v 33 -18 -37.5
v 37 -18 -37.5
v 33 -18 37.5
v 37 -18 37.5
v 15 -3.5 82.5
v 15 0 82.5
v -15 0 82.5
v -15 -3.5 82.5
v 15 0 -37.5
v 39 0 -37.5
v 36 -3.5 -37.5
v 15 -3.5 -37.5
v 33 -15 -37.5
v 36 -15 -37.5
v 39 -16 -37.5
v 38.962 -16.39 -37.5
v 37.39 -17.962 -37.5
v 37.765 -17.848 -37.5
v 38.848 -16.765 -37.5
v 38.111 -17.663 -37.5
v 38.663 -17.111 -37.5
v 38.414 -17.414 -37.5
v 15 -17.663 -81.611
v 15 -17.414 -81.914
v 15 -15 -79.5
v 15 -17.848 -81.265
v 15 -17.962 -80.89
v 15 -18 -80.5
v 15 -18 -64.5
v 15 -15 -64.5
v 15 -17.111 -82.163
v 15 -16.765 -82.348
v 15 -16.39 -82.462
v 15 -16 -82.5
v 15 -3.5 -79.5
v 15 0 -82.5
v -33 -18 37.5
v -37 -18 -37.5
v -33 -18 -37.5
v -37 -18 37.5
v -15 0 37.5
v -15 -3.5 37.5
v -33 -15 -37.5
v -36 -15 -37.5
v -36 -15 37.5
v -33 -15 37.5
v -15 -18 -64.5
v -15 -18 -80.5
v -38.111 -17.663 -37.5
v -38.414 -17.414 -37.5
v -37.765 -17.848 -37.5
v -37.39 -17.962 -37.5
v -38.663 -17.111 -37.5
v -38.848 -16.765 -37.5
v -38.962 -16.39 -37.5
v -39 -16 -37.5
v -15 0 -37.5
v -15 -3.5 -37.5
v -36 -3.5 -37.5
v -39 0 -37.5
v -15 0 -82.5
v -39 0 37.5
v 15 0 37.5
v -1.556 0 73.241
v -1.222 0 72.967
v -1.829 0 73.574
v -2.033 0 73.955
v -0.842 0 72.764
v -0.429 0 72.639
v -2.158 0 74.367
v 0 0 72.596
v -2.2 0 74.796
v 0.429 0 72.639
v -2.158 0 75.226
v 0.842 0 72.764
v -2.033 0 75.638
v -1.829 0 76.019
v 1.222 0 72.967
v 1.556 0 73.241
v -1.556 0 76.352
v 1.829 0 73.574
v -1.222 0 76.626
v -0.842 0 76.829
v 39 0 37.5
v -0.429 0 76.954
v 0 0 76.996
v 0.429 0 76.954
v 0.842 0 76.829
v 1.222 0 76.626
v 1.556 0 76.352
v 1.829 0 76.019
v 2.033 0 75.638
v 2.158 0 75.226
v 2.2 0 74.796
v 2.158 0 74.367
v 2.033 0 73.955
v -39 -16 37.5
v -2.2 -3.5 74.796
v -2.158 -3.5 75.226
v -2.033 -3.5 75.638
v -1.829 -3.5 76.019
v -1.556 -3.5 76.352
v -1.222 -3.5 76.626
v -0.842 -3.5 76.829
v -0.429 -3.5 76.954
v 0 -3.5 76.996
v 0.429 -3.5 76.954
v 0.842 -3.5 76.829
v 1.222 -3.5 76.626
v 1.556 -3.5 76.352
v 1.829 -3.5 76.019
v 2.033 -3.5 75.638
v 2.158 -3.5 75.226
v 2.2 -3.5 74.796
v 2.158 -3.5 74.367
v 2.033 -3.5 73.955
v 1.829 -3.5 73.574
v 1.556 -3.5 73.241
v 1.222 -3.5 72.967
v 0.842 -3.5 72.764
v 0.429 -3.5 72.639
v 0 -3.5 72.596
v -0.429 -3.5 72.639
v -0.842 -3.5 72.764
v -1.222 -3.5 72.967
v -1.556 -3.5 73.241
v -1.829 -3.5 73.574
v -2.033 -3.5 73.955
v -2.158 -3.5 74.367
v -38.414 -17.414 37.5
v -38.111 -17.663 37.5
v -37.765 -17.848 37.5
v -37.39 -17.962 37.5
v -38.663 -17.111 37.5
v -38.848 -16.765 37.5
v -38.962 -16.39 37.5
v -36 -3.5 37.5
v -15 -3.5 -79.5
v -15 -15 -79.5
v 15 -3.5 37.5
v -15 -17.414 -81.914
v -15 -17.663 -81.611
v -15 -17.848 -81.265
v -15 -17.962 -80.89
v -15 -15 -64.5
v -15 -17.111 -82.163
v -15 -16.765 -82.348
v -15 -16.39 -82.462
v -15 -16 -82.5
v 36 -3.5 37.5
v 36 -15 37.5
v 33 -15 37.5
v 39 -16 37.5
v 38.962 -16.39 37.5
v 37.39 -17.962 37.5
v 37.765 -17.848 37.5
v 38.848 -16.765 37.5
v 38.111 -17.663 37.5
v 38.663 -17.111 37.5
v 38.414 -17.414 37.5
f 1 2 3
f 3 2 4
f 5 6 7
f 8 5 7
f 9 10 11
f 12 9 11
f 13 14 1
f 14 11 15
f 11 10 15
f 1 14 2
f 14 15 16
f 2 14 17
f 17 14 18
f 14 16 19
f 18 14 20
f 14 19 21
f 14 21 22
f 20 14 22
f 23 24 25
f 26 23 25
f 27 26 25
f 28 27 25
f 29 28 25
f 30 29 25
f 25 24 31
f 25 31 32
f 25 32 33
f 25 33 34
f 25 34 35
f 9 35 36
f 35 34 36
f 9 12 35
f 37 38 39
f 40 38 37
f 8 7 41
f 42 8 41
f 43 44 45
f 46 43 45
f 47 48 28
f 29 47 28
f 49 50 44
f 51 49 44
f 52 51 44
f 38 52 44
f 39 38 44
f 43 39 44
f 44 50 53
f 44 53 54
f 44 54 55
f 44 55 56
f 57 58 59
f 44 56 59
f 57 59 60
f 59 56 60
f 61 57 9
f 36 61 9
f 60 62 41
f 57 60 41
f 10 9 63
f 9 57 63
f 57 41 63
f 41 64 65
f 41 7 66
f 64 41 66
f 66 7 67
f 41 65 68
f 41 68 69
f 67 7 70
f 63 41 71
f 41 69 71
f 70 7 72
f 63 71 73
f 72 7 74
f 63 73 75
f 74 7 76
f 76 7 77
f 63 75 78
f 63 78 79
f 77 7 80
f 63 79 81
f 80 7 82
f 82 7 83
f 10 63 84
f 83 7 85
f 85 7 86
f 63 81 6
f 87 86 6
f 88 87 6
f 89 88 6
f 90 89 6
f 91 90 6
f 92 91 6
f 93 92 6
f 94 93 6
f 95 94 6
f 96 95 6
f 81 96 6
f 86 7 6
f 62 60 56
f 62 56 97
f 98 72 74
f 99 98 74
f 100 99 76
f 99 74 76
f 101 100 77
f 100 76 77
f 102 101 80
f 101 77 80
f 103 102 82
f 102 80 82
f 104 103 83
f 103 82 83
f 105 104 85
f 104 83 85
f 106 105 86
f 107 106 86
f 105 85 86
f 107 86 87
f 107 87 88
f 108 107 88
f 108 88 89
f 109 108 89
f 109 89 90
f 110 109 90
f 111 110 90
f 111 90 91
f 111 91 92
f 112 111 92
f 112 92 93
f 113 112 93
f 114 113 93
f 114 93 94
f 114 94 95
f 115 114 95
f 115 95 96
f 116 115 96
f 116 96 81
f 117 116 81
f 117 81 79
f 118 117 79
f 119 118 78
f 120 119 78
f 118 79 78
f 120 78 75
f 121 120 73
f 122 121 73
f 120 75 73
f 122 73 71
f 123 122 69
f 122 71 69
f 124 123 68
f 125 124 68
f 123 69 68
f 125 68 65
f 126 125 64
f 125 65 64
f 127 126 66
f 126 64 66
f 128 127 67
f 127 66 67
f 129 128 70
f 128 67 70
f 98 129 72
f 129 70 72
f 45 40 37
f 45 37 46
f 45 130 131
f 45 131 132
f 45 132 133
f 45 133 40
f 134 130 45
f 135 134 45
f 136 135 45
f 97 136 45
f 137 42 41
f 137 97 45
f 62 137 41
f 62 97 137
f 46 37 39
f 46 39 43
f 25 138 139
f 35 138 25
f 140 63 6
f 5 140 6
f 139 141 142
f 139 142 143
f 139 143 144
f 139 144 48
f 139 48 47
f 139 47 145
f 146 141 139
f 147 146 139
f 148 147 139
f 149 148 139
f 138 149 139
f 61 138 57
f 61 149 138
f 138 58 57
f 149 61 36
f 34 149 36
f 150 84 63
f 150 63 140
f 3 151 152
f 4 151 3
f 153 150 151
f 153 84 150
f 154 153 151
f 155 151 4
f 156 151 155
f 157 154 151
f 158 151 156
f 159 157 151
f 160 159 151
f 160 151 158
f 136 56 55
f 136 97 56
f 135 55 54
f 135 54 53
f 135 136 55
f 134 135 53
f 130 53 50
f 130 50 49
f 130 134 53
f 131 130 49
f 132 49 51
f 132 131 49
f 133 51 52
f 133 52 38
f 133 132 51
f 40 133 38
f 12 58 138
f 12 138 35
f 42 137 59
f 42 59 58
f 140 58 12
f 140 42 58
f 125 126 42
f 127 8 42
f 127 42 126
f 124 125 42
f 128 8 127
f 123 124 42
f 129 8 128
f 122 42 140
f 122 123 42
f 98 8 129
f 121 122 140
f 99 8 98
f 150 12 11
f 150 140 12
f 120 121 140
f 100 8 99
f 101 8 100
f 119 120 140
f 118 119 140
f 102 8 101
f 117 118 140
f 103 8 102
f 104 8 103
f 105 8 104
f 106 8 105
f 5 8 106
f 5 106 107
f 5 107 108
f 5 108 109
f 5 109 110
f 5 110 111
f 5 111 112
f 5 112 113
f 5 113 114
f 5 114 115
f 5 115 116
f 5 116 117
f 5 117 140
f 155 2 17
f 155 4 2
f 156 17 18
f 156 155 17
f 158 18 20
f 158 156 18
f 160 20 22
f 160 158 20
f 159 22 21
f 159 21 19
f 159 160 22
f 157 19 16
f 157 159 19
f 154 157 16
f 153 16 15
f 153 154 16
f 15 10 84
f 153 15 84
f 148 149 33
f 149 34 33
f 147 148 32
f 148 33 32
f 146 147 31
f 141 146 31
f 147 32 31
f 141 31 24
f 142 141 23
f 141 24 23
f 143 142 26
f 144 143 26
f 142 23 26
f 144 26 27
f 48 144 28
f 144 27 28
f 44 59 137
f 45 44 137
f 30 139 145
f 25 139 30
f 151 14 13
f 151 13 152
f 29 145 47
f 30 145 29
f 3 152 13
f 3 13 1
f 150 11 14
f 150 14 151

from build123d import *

# Parameters (mm, degrees)
F1_DEPTH  = 3.5
F2_W      = 30
F2_H      = 3
F3_DEPTH  = 14.5
F4_W      = 30
F4_H      = 3
F5_DEPTH  = 15
F6_W      = 3
F6_H      = 75
F7_DEPTH  = 14.5
F8_W      = 3
F8_H      = 75
F9_DEPTH  = 14.5
F10_W     = 3
F10_H     = 75
F11_DEPTH = 3
F12_W     = 3
F12_H     = 75
F13_DEPTH = 3
F14_R     = 2
F15_R     = 2
F16_R     = 2
F18_D     = 4.4


with BuildPart() as f1:
    # F0 (on Front) → F1 (new body)
    with BuildSketch(Plane.XZ):
        Polygon((15, 82.5), (-15, 82.5), (-15, 37.5), (-39, 37.5), (-39, -37.5), (-15, -37.5), (-15, -82.5), (15, -82.5), (15, -37.5), (39, -37.5), (39, 37.5), (15, 37.5), align=None)
    extrude(amount=F1_DEPTH)

    # F2 (on face) → F3 (join)
    with BuildSketch(Plane.XZ.offset(3.5)):
        with Locations((0, -81)):
            Rectangle(F2_W, F2_H)
    extrude(amount=F3_DEPTH)

    # F4 (on face) → F5 (join)
    with BuildSketch(Plane.XY.offset(-79.5)):
        with Locations((0, -16.5)):
            Rectangle(F4_W, F4_H)
    extrude(amount=F5_DEPTH)

    # F6 (on face) → F7 (join)
    with BuildSketch(Plane.XZ.offset(3.5)):
        with Locations((-37.5, 0)):
            Rectangle(F6_W, F6_H)
    extrude(amount=F7_DEPTH)

    # F8 (on face) → F9 (join)
    with BuildSketch(Plane.XZ.offset(3.5)):
        with Locations((37.5, 0)):
            Rectangle(F8_W, F8_H)
    extrude(amount=F9_DEPTH)

    # F10 (on face) → F11 (join)
    with BuildSketch(Plane.YZ.offset(-36)):
        with Locations((-16.5, 0)):
            Rectangle(F10_W, F10_H)
    extrude(amount=F11_DEPTH)

    # F12 (on face) → F13 (join)
    with BuildSketch(Plane(origin=(36, 0, 0), x_dir=(0, -1, 0), z_dir=(-1, 0, 0))):
        with Locations((16.5, 0)):
            Rectangle(F12_W, F12_H)
    extrude(amount=F13_DEPTH)

    # F14
    f14_edges = [f1.edges().sort_by_distance(p)[0] for p in [
        (39, -18, 0),
    ]]
    fillet(f14_edges, radius=F14_R)

    # F15
    f15_edges = [f1.edges().sort_by_distance(p)[0] for p in [
        (-39, -18, 0),
    ]]
    fillet(f15_edges, radius=F15_R)

    # F16
    f16_edges = [f1.edges().sort_by_distance(p)[0] for p in [
        (0, -18, -82.5),
    ]]
    fillet(f16_edges, radius=F16_R)

    # F18 (through all)
    with Locations(Plane.XZ.offset(3.5)):
        with Locations((0, 74.796483)):
            Hole(F18_D / 2)


solid = f1.part
